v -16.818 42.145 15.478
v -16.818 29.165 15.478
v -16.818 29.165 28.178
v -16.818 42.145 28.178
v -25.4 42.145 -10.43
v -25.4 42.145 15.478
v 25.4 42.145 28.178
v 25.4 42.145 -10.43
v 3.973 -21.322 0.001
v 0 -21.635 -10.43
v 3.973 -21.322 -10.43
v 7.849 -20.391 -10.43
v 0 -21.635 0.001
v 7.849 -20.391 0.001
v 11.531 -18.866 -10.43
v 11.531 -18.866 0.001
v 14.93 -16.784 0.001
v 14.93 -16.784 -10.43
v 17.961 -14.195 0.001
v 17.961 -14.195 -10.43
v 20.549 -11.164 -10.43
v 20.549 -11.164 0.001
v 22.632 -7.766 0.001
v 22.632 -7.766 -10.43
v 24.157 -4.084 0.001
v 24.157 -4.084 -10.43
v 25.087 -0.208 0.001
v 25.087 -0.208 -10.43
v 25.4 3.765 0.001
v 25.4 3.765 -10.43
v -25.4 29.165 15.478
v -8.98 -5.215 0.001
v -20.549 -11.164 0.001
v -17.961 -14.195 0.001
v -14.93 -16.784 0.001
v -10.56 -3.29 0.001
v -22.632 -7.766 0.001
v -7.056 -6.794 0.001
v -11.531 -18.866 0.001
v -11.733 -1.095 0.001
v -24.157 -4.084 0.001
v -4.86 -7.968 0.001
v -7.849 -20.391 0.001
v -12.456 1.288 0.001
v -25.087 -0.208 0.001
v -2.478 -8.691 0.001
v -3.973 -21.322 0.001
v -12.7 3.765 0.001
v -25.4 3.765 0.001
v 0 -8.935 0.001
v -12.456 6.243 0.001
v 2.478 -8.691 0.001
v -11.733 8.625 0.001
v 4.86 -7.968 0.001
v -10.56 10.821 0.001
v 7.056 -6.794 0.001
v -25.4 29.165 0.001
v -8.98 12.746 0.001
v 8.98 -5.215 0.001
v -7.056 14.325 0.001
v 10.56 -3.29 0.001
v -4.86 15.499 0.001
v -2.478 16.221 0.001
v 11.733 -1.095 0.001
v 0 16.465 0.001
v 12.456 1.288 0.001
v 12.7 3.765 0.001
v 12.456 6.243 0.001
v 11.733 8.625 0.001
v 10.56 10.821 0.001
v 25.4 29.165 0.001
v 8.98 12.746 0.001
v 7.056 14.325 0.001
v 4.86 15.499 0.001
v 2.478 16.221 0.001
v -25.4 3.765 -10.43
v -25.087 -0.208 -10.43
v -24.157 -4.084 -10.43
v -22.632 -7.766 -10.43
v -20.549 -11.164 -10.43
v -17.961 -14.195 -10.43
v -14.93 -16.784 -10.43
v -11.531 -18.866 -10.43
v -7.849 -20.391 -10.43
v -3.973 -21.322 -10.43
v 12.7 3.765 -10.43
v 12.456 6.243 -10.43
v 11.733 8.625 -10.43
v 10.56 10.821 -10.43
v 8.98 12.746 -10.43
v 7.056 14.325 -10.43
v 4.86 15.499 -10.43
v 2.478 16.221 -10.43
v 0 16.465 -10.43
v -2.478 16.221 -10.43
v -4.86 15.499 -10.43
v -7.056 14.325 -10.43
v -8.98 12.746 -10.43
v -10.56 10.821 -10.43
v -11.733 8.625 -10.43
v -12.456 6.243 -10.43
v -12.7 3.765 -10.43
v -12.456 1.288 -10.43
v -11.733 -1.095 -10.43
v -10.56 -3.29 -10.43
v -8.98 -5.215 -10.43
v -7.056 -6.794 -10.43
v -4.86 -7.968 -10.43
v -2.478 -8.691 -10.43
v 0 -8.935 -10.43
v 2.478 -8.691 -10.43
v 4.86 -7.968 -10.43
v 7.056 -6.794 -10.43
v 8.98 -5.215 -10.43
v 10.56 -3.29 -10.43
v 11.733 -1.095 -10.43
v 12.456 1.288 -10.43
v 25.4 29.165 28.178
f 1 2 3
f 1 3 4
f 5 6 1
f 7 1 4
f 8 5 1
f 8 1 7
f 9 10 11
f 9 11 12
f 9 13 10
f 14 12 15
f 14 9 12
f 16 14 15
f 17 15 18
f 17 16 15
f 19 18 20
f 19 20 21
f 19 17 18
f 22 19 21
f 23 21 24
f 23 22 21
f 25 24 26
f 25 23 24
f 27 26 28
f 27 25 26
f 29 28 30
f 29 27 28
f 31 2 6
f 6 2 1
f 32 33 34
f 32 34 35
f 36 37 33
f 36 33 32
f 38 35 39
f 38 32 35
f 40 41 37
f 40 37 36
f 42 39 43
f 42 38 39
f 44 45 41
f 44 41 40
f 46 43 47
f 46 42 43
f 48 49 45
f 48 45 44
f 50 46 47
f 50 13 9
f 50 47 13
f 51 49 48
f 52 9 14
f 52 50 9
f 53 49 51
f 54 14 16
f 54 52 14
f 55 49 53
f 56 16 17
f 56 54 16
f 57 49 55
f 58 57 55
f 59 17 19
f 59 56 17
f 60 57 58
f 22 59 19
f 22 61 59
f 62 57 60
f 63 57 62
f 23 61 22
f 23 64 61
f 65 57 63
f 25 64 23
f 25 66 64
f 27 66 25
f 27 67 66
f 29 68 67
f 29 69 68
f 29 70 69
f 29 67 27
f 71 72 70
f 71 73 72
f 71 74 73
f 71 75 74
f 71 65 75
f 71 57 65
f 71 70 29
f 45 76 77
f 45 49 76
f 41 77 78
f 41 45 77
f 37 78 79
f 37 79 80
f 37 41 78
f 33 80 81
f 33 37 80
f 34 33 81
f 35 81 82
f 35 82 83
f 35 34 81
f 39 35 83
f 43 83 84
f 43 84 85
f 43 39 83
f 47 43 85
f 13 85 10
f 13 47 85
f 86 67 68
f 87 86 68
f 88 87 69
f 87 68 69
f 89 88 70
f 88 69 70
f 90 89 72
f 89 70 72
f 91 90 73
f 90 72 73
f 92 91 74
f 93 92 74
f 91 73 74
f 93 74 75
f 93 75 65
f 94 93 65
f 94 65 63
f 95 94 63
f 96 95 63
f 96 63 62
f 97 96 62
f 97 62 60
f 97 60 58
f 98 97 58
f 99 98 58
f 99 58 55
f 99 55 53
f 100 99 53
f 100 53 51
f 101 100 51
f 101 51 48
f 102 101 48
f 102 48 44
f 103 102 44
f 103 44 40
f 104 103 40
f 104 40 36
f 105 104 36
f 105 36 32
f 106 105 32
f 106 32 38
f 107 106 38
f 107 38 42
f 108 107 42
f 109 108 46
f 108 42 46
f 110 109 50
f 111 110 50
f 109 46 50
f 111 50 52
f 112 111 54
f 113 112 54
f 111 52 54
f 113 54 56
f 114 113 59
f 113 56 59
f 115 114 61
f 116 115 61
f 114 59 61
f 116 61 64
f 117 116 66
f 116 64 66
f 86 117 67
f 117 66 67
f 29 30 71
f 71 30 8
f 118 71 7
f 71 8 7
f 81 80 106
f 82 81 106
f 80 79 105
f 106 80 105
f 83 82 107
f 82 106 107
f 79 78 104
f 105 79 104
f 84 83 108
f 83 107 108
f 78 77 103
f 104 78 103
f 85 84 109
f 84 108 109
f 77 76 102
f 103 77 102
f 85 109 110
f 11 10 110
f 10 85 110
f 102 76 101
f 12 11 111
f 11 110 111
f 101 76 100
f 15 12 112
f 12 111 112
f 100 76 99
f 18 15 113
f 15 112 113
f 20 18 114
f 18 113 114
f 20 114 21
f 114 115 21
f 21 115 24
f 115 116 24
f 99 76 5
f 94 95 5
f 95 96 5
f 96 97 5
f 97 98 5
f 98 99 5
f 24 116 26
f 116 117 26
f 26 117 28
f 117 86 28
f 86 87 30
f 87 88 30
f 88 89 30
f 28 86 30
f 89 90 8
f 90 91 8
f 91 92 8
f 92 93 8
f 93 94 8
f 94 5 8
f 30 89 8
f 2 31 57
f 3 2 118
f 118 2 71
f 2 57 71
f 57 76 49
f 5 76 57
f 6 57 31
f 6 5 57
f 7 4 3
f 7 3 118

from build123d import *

# Parameters (mm, degrees)
F0_W     = 12.9794
F0_H     = 25.908
F1_DEPTH = 25.4
F2_W     = 42.2184414506
F2_H     = 12.9794
F3_DEPTH = 12.7
F4_W     = 50.8
F4_H     = 10.4306445336
F5_DEPTH = 50.8
F6_R     = 12.7
F7_DEPTH = 10.4316445336
F8_R     = 25.4
F9_R     = 25.39999


# Not quite as in the source:
# - a fillet or chamfer is up to 0.001 mm smaller than in the source, because OpenCascade refuses the exact size


with BuildPart() as f1:
    # F0 (on Right) → F1 (new body, symmetric)
    with BuildSketch(Plane.YZ):
        with Locations((35.6550812721, 2.5243262509)):
            Rectangle(F0_W, F0_H)
    extrude(amount=F1_DEPTH, both=True)

    # F2 (on face) → F3 (join)
    with BuildSketch(Plane.XY.offset(15.4783262509)):
        with Locations((4.2907792747, 35.6550812721)):
            Rectangle(F2_W, F2_H)
    extrude(amount=F3_DEPTH)

    # F4 (on face) → F5 (join)
    with BuildSketch(Plane.XZ.offset(-29.1653812721)):
        with Locations((0, -5.2143514823)):
            Rectangle(F4_W, F4_H)
    extrude(amount=F5_DEPTH)

    # F6 (on face) → F7 (cut, through all)
    with BuildSketch(Plane.XY.offset(0.0009707845)):
        with Locations((0, 3.7653812721)):
            Circle(F6_R)
    extrude(amount=-F7_DEPTH, mode=Mode.SUBTRACT)

    # F8
    f8_edges = [f1.edges().sort_by_distance(p)[0] for p in [
        (-25.4, -21.634619, -5.214351),
    ]]
    fillet(f8_edges, radius=F8_R)

    # F9 (radius 25.4 in the source; OpenCascade refuses exactly that, so slightly less here)
    f9_edges = [f1.edges().sort_by_distance(p)[0] for p in [
        (25.4, -21.634619, -5.214351),
    ]]
    fillet(f9_edges, radius=F9_R)


solid = f1.part
